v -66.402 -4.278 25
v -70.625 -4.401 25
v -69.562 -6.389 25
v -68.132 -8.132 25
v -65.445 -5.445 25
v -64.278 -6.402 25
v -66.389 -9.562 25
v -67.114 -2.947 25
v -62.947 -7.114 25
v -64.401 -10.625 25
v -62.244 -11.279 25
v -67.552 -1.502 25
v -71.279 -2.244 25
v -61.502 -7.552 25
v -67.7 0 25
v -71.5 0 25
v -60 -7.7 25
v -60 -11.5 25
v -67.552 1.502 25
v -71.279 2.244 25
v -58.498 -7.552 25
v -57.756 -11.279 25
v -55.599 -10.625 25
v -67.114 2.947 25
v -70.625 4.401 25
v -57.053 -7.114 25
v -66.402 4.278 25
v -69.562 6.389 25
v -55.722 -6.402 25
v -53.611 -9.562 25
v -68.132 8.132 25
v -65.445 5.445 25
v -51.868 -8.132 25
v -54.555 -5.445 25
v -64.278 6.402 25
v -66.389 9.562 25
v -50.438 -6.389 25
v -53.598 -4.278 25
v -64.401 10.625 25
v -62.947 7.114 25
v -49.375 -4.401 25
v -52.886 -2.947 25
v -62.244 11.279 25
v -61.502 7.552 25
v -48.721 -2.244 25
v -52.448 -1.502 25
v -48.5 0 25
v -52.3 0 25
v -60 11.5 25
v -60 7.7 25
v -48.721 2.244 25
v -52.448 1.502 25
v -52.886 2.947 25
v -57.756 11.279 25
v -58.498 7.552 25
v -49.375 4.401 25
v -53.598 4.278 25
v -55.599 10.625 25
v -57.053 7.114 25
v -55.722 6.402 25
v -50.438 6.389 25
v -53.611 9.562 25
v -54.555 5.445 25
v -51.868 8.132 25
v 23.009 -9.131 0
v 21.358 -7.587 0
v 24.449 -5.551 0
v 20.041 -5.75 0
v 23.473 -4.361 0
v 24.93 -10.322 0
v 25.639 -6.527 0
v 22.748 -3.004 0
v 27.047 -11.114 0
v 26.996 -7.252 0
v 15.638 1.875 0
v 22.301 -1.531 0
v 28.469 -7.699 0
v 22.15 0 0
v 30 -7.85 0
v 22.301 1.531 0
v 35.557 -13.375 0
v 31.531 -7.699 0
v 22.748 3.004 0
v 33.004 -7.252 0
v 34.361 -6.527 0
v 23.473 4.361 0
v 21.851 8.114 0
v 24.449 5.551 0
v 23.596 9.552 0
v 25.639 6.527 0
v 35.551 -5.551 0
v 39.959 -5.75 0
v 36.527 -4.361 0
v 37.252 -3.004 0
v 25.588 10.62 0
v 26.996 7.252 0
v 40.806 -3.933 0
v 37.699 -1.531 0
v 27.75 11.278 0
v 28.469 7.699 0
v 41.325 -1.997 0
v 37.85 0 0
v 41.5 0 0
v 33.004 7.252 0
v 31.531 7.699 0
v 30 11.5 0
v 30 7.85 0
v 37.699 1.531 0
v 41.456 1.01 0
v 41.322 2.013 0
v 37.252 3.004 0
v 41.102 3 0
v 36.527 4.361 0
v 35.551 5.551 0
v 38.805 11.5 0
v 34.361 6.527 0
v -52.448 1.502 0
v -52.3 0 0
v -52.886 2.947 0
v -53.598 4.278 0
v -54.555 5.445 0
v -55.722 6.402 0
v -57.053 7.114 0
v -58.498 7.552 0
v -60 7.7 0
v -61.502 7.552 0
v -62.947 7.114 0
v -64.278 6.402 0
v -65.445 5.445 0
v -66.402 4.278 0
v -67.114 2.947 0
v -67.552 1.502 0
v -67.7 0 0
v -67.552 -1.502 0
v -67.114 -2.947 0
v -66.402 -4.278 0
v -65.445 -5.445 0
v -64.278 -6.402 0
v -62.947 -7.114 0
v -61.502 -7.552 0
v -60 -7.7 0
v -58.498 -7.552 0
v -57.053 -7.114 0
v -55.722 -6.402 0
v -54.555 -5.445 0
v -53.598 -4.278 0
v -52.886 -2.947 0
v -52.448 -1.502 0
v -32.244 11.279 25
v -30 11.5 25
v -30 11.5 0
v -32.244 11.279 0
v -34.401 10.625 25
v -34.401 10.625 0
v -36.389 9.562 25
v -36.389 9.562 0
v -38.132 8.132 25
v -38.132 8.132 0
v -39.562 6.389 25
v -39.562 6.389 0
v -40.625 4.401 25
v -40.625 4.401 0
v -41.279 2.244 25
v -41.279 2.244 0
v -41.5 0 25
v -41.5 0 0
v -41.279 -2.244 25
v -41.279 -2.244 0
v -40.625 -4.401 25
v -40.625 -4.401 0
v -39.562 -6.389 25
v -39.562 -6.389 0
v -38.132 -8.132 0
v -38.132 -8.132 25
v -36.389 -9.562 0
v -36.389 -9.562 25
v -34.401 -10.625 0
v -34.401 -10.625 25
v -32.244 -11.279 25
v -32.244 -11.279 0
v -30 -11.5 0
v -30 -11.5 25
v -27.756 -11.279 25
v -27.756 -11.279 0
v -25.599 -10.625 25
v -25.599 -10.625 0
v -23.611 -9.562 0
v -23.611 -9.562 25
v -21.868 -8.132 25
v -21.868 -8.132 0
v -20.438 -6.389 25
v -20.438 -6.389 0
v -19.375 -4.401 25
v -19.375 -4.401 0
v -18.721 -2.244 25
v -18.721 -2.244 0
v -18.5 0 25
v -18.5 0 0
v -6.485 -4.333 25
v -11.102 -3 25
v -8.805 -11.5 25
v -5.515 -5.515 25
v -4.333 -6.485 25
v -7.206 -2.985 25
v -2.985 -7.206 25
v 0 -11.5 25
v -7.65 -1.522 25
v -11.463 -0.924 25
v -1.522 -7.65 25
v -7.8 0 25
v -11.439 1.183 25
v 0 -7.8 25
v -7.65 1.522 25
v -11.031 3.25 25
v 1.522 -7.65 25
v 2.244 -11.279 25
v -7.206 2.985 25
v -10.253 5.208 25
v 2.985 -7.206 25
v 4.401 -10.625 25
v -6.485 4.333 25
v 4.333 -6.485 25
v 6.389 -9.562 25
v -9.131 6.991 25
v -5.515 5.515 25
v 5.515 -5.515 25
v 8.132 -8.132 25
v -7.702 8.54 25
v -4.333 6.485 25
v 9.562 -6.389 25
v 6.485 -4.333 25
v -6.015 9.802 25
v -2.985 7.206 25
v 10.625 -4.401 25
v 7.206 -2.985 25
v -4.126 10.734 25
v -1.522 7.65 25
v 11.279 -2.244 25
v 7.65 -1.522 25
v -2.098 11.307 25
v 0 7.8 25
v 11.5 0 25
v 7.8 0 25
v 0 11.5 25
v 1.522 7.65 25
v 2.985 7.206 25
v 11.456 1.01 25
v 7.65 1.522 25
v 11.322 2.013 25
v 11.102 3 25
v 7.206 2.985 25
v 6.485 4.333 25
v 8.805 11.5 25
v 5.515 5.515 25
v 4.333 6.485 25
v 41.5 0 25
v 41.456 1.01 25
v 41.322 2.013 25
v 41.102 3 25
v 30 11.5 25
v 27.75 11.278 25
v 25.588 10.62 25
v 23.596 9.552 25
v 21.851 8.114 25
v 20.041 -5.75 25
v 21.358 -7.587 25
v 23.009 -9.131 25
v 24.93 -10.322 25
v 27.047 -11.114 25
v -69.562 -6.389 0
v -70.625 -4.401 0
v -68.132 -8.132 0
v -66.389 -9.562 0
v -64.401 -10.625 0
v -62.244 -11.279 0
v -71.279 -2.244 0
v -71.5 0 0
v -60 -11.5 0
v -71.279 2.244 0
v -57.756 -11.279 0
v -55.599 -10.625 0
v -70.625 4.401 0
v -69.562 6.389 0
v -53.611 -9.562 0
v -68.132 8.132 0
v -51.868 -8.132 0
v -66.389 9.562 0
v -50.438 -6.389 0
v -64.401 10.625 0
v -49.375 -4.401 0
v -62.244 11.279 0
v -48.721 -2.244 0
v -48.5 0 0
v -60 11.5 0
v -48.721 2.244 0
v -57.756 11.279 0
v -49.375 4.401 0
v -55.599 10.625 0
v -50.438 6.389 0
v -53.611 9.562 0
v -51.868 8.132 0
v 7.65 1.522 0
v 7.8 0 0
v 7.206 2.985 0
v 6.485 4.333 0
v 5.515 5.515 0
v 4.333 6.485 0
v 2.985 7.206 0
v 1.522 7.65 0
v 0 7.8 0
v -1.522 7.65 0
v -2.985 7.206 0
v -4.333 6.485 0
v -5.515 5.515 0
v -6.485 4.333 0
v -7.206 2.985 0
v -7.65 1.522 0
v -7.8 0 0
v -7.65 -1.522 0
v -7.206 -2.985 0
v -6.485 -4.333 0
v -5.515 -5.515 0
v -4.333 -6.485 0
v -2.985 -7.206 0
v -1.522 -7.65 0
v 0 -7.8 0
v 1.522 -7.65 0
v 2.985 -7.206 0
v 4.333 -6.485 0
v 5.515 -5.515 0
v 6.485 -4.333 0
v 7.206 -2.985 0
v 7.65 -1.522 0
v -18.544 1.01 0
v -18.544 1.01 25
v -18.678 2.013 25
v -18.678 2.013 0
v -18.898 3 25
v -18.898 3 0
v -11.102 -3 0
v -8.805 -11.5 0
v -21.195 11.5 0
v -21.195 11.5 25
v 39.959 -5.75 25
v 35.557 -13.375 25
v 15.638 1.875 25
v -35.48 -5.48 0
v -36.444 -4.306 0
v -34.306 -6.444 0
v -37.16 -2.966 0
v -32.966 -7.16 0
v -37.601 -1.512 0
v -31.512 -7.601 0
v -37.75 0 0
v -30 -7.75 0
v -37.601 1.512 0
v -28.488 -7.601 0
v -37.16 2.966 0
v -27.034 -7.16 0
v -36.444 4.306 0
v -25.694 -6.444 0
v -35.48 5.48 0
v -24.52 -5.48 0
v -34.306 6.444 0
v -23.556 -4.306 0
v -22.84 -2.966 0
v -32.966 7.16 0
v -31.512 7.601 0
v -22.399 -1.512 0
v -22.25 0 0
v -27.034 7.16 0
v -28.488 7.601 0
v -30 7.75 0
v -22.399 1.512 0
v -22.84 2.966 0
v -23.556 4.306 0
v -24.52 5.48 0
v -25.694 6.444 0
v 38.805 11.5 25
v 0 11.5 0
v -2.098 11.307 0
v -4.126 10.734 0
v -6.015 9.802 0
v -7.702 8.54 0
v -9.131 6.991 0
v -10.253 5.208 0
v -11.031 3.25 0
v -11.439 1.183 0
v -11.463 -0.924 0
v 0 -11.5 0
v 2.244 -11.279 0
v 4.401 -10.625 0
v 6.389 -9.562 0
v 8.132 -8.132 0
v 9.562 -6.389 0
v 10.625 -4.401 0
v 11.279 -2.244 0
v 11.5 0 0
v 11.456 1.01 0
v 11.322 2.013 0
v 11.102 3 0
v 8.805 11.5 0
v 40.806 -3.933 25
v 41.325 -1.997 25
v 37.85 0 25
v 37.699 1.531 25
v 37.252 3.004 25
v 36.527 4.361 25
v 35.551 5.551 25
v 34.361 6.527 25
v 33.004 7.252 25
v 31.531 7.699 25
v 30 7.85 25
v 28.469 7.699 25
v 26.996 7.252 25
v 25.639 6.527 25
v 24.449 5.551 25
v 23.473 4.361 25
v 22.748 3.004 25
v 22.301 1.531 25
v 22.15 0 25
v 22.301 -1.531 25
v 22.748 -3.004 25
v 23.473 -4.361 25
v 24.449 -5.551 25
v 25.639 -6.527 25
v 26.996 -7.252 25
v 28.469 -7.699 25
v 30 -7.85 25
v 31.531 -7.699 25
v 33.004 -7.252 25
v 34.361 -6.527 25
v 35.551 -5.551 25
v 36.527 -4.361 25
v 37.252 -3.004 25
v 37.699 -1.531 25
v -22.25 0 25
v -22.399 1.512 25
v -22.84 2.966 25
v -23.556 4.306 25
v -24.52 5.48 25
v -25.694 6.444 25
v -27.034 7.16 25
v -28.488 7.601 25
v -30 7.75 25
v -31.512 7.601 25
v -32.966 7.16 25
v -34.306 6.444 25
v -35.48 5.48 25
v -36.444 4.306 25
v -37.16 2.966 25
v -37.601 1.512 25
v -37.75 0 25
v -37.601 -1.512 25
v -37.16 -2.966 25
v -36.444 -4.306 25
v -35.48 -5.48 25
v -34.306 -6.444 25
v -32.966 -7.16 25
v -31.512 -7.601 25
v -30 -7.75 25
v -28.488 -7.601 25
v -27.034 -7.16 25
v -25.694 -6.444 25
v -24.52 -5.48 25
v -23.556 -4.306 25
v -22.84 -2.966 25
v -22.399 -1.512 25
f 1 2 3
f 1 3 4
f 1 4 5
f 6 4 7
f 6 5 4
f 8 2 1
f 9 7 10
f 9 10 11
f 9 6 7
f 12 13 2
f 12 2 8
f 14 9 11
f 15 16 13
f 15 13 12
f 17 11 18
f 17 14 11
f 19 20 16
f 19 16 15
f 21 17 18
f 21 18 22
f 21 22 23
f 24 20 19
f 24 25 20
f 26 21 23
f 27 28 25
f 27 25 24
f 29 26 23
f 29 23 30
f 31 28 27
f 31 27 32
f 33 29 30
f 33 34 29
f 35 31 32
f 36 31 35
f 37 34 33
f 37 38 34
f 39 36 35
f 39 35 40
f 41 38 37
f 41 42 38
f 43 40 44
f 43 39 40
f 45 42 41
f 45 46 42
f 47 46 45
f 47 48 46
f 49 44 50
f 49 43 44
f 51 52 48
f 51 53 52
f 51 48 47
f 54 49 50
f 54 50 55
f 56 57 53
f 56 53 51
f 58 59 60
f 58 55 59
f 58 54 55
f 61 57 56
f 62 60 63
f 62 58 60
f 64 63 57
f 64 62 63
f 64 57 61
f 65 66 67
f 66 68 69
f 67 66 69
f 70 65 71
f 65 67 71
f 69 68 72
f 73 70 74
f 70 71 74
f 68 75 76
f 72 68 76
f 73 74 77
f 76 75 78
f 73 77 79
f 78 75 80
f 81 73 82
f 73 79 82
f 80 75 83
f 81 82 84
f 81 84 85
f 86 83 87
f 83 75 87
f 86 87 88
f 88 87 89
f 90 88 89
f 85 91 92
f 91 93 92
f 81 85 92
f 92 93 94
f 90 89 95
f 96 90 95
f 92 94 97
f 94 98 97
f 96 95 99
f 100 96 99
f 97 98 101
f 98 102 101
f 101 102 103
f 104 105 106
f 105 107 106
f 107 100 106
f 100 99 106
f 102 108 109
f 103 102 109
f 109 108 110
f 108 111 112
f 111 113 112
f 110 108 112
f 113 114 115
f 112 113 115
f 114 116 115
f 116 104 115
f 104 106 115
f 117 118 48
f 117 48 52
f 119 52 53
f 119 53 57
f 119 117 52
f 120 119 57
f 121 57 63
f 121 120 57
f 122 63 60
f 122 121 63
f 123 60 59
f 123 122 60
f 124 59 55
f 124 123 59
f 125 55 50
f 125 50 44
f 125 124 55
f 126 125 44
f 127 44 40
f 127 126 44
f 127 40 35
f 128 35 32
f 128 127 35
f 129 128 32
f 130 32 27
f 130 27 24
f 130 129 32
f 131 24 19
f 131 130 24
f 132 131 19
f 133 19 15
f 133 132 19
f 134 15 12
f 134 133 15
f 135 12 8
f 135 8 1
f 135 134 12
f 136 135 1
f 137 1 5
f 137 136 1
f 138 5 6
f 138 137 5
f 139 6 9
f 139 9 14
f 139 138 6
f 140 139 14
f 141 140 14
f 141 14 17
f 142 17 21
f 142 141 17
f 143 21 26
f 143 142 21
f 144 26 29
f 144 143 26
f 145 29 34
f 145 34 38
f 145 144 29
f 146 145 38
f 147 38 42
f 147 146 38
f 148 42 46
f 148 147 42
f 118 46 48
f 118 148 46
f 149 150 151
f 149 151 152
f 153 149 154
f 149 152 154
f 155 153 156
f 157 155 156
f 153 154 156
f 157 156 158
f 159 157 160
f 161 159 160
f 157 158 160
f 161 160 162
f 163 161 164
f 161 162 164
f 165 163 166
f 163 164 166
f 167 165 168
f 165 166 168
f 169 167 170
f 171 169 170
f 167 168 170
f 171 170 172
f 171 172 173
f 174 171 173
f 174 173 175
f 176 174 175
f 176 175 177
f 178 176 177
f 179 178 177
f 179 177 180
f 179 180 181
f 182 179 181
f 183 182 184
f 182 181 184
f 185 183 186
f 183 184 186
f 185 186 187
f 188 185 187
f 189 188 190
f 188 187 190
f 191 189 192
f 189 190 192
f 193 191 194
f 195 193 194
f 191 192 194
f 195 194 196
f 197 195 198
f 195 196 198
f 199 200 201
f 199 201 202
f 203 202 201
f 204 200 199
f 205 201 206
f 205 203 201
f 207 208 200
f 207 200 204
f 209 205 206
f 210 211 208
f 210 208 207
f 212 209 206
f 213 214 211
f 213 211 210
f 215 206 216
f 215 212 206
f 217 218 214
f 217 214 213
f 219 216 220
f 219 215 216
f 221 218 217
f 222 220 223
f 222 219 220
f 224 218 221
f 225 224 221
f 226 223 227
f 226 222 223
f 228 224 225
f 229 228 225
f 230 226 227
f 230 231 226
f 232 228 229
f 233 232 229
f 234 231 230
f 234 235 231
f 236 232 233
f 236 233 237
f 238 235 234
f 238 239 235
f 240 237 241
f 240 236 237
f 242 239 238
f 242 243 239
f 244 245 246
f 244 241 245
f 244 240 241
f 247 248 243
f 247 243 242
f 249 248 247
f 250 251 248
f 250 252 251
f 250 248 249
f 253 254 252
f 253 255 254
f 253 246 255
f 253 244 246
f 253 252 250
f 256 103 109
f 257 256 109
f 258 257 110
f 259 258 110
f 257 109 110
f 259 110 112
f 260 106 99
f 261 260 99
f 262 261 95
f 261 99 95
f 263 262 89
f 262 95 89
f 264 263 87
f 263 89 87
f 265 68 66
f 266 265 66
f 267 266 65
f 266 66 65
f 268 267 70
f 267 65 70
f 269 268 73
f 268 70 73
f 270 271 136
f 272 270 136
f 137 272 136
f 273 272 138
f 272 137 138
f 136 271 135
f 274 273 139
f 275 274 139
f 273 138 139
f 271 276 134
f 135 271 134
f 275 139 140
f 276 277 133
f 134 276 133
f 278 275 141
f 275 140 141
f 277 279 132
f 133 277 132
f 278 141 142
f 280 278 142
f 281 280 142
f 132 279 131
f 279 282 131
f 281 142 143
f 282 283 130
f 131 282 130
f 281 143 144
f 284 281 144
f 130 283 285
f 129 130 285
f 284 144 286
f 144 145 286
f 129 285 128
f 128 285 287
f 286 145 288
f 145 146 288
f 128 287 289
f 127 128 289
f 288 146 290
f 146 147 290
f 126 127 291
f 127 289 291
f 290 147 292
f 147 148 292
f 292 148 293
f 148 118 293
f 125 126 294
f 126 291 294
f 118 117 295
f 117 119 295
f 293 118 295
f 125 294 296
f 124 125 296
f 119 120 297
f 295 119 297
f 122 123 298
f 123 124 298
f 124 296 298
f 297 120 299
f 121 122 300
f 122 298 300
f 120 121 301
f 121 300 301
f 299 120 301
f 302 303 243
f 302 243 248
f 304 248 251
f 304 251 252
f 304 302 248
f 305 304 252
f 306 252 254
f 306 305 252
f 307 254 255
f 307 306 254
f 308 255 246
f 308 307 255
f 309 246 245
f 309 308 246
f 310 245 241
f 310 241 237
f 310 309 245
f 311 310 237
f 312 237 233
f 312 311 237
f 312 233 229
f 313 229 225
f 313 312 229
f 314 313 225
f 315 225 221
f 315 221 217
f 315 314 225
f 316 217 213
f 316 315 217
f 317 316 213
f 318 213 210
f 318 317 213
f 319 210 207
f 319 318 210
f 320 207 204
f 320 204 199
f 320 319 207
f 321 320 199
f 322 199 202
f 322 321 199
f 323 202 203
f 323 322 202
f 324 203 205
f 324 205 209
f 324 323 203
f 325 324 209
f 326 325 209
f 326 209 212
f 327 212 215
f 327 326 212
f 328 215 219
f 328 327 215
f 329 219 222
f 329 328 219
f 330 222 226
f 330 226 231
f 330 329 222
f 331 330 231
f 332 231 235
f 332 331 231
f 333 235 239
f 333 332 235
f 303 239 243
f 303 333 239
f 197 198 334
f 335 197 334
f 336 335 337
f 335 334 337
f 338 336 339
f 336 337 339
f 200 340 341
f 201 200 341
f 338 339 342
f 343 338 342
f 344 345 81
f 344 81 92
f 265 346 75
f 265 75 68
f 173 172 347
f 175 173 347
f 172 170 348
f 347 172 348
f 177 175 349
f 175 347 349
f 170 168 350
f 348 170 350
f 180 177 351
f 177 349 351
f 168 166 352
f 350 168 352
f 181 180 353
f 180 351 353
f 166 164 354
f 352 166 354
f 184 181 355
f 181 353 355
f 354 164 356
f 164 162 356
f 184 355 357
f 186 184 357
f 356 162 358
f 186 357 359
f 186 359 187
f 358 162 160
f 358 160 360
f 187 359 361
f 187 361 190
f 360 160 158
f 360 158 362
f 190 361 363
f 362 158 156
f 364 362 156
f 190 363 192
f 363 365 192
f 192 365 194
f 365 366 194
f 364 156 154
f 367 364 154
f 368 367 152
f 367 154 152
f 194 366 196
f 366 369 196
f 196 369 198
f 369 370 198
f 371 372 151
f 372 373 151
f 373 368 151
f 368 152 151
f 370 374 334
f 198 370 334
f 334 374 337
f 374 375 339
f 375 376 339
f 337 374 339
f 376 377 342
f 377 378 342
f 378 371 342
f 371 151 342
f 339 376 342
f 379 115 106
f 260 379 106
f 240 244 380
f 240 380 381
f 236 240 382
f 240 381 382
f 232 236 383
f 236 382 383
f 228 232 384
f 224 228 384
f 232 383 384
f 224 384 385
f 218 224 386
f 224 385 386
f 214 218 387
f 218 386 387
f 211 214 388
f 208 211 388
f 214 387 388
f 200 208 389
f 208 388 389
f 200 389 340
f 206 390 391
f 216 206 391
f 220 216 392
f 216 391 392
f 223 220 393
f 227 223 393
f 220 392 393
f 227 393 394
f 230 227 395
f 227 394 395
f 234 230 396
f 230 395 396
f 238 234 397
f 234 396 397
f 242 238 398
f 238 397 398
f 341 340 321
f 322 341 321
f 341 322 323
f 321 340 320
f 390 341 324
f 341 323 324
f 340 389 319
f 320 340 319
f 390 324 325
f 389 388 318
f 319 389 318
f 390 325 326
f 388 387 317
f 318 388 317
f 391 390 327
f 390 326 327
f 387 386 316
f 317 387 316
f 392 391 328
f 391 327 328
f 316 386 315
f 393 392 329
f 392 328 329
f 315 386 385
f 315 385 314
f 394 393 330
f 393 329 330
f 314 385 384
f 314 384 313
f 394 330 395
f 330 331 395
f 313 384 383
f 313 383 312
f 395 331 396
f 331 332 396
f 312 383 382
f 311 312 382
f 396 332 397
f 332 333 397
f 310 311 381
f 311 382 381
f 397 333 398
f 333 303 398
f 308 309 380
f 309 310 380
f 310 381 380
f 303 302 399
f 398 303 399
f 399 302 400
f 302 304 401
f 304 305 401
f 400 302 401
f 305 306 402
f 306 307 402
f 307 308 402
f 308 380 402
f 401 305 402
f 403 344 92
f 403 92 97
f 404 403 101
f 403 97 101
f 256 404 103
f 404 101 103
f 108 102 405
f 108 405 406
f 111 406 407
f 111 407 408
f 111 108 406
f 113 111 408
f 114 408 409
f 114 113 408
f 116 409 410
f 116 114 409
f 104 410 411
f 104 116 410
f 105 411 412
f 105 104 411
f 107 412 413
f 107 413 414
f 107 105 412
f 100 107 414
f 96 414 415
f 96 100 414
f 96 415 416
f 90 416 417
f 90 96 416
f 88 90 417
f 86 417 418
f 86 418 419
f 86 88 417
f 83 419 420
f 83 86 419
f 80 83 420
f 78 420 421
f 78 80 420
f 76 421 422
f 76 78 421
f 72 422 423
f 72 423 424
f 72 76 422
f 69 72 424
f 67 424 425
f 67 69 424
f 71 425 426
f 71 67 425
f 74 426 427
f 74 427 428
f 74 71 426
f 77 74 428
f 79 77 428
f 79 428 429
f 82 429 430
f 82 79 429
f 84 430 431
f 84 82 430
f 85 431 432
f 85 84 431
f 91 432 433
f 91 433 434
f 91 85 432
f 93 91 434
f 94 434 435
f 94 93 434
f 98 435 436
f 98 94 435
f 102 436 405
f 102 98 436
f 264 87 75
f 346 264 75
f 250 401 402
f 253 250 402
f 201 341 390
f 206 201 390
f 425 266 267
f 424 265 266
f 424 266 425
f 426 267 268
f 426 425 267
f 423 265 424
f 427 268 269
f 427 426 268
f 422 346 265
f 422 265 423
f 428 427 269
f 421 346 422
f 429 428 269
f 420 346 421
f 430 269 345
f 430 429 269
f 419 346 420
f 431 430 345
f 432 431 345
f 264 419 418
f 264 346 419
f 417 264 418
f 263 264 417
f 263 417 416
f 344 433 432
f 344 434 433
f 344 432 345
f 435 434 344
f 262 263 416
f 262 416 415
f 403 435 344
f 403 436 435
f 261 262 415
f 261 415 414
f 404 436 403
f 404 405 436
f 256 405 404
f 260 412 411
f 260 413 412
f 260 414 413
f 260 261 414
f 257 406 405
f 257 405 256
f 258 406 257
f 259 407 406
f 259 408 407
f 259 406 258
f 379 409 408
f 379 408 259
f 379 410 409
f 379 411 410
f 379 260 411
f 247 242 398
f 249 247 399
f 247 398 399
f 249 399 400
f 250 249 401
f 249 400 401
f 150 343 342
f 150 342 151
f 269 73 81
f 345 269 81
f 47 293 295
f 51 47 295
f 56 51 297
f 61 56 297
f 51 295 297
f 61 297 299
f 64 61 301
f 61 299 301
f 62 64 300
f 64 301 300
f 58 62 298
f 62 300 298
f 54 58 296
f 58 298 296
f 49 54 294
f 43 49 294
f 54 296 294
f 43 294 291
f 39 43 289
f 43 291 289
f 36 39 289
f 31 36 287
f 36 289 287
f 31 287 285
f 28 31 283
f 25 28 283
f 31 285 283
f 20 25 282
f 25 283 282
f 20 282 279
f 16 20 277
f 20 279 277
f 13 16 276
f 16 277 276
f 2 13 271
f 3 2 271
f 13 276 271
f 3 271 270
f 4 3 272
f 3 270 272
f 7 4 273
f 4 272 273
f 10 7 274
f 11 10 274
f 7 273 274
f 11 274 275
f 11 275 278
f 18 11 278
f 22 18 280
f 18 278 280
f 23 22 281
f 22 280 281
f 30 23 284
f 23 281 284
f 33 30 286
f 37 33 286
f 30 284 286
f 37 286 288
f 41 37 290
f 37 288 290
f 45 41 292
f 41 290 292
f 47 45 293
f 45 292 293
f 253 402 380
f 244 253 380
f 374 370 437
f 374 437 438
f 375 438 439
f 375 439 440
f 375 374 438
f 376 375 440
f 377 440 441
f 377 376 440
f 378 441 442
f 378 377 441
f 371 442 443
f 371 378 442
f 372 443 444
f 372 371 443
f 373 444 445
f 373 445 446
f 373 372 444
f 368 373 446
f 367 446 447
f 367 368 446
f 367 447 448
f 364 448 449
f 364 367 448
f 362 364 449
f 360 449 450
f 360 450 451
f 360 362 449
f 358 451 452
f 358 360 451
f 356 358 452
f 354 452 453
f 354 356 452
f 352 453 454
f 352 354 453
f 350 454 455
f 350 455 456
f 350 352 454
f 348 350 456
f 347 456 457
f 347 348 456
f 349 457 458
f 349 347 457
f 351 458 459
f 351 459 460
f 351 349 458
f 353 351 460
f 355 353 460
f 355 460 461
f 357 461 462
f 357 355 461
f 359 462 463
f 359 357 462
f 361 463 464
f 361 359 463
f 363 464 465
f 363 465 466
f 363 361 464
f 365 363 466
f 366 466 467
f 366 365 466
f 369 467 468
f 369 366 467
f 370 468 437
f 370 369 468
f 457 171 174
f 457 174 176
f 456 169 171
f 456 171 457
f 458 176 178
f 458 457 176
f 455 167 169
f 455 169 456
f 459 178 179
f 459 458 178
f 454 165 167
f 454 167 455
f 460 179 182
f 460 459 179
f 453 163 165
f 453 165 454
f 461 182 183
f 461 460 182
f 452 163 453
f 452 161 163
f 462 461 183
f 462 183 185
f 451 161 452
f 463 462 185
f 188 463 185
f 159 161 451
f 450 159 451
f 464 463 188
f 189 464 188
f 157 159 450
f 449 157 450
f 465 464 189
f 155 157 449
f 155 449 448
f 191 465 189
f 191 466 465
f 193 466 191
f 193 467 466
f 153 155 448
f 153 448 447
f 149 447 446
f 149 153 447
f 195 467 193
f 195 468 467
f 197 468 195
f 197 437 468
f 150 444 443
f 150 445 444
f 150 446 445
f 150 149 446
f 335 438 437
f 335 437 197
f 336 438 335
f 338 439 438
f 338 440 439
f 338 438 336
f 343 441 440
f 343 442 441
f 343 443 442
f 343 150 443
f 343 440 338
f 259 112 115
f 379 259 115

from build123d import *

# Parameters (mm, degrees)
F0_R     = 7.75
F0_R_2   = 7.8
F0_R_3   = 7.85
F0_R_4   = 11.5
F0_R_5   = 7.7
F1_DEPTH = 25


with BuildPart() as f1:
    # F0 (on Top) → F1 (new body)
    with BuildSketch(Plane.XY):
        with BuildLine():
            ThreePointArc((-30, 11.5), (-38.131728, -8.131728), (-18.5, 0))
            ThreePointArc((-18.5, 0), (-18.599984, 1.513156), (-18.898198, 3))
            ThreePointArc((-18.898198, 3), (-23.008934, 9.130991), (-30, 11.5))
        make_face()
        with Locations((-30, 0)):
            Circle(F0_R, mode=Mode.SUBTRACT)
        with BuildLine():
            ThreePointArc((-30, 11.5), (-23.008934, 9.130991), (-18.898198, 3))
            Line((-18.898198, 3), (-21.195123, 11.5))
            Line((-21.195123, 11.5), (-30, 11.5))
        make_face()
        with BuildLine():
            ThreePointArc((0, -11.5), (8.131728, -8.131728), (11.5, 0))
            ThreePointArc((11.5, 0), (11.400016, 1.513156), (11.101802, 3))
            ThreePointArc((11.101802, 3), (6.991066, 9.130991), (0, 11.5))
            ThreePointArc((0, 11.5), (-9.130991, 6.991066), (-11.101802, -3))
            ThreePointArc((-11.101802, -3), (-6.991066, -9.130991), (0, -11.5))
        make_face()
        Circle(F0_R_2, mode=Mode.SUBTRACT)
        with BuildLine():
            ThreePointArc((0, 11.5), (6.991066, 9.130991), (11.101802, 3))
            Line((11.101802, 3), (8.804877, 11.5))
            Line((8.804877, 11.5), (0, 11.5))
        make_face()
        with BuildLine():
            Line((-8.804877, -11.5), (0, -11.5))
            ThreePointArc((0, -11.5), (-6.991066, -9.130991), (-11.101802, -3))
            Line((-11.101802, -3), (-8.804877, -11.5))
        make_face()
        with BuildLine():
            ThreePointArc((39.959292, -5.75), (41.108147, -2.976419), (41.5, 0))
            ThreePointArc((41.5, 0), (41.400016, 1.513156), (41.101802, 3))
            ThreePointArc((41.101802, 3), (36.991066, 9.130991), (30, 11.5))
            ThreePointArc((30, 11.5), (25.587863, 10.619936), (21.851023, 8.114442))
            ThreePointArc((21.851023, 8.114442), (18.596797, 1.488945), (20.040708, -5.75))
            ThreePointArc((20.040708, -5.75), (23.008934, -9.130991), (27.047175, -11.114442))
            ThreePointArc((27.047175, -11.114442), (34.412137, -10.619936), (39.959292, -5.75))
        make_face()
        with Locations((30, 0)):
            Circle(F0_R_3, mode=Mode.SUBTRACT)
        with BuildLine():
            ThreePointArc((30, 11.5), (36.991066, 9.130991), (41.101802, 3))
            Line((41.101802, 3), (38.804877, 11.5))
            Line((38.804877, 11.5), (30, 11.5))
        make_face()
        with BuildLine():
            Line((35.556854, -13.375247), (39.959292, -5.75))
            ThreePointArc((39.959292, -5.75), (34.412137, -10.619936), (27.047175, -11.114442))
            Line((27.047175, -11.114442), (35.556854, -13.375247))
        make_face()
        with BuildLine():
            ThreePointArc((20.040708, -5.75), (18.596797, 1.488945), (21.851023, 8.114442))
            Line((21.851023, 8.114442), (15.638269, 1.875247))
            Line((15.638269, 1.875247), (20.040708, -5.75))
        make_face()
        with Locations((-60, 0)):
            Circle(F0_R_4)
        with Locations((-60, 0)):
            Circle(F0_R_5, mode=Mode.SUBTRACT)
    extrude(amount=F1_DEPTH)


solid = f1.part
